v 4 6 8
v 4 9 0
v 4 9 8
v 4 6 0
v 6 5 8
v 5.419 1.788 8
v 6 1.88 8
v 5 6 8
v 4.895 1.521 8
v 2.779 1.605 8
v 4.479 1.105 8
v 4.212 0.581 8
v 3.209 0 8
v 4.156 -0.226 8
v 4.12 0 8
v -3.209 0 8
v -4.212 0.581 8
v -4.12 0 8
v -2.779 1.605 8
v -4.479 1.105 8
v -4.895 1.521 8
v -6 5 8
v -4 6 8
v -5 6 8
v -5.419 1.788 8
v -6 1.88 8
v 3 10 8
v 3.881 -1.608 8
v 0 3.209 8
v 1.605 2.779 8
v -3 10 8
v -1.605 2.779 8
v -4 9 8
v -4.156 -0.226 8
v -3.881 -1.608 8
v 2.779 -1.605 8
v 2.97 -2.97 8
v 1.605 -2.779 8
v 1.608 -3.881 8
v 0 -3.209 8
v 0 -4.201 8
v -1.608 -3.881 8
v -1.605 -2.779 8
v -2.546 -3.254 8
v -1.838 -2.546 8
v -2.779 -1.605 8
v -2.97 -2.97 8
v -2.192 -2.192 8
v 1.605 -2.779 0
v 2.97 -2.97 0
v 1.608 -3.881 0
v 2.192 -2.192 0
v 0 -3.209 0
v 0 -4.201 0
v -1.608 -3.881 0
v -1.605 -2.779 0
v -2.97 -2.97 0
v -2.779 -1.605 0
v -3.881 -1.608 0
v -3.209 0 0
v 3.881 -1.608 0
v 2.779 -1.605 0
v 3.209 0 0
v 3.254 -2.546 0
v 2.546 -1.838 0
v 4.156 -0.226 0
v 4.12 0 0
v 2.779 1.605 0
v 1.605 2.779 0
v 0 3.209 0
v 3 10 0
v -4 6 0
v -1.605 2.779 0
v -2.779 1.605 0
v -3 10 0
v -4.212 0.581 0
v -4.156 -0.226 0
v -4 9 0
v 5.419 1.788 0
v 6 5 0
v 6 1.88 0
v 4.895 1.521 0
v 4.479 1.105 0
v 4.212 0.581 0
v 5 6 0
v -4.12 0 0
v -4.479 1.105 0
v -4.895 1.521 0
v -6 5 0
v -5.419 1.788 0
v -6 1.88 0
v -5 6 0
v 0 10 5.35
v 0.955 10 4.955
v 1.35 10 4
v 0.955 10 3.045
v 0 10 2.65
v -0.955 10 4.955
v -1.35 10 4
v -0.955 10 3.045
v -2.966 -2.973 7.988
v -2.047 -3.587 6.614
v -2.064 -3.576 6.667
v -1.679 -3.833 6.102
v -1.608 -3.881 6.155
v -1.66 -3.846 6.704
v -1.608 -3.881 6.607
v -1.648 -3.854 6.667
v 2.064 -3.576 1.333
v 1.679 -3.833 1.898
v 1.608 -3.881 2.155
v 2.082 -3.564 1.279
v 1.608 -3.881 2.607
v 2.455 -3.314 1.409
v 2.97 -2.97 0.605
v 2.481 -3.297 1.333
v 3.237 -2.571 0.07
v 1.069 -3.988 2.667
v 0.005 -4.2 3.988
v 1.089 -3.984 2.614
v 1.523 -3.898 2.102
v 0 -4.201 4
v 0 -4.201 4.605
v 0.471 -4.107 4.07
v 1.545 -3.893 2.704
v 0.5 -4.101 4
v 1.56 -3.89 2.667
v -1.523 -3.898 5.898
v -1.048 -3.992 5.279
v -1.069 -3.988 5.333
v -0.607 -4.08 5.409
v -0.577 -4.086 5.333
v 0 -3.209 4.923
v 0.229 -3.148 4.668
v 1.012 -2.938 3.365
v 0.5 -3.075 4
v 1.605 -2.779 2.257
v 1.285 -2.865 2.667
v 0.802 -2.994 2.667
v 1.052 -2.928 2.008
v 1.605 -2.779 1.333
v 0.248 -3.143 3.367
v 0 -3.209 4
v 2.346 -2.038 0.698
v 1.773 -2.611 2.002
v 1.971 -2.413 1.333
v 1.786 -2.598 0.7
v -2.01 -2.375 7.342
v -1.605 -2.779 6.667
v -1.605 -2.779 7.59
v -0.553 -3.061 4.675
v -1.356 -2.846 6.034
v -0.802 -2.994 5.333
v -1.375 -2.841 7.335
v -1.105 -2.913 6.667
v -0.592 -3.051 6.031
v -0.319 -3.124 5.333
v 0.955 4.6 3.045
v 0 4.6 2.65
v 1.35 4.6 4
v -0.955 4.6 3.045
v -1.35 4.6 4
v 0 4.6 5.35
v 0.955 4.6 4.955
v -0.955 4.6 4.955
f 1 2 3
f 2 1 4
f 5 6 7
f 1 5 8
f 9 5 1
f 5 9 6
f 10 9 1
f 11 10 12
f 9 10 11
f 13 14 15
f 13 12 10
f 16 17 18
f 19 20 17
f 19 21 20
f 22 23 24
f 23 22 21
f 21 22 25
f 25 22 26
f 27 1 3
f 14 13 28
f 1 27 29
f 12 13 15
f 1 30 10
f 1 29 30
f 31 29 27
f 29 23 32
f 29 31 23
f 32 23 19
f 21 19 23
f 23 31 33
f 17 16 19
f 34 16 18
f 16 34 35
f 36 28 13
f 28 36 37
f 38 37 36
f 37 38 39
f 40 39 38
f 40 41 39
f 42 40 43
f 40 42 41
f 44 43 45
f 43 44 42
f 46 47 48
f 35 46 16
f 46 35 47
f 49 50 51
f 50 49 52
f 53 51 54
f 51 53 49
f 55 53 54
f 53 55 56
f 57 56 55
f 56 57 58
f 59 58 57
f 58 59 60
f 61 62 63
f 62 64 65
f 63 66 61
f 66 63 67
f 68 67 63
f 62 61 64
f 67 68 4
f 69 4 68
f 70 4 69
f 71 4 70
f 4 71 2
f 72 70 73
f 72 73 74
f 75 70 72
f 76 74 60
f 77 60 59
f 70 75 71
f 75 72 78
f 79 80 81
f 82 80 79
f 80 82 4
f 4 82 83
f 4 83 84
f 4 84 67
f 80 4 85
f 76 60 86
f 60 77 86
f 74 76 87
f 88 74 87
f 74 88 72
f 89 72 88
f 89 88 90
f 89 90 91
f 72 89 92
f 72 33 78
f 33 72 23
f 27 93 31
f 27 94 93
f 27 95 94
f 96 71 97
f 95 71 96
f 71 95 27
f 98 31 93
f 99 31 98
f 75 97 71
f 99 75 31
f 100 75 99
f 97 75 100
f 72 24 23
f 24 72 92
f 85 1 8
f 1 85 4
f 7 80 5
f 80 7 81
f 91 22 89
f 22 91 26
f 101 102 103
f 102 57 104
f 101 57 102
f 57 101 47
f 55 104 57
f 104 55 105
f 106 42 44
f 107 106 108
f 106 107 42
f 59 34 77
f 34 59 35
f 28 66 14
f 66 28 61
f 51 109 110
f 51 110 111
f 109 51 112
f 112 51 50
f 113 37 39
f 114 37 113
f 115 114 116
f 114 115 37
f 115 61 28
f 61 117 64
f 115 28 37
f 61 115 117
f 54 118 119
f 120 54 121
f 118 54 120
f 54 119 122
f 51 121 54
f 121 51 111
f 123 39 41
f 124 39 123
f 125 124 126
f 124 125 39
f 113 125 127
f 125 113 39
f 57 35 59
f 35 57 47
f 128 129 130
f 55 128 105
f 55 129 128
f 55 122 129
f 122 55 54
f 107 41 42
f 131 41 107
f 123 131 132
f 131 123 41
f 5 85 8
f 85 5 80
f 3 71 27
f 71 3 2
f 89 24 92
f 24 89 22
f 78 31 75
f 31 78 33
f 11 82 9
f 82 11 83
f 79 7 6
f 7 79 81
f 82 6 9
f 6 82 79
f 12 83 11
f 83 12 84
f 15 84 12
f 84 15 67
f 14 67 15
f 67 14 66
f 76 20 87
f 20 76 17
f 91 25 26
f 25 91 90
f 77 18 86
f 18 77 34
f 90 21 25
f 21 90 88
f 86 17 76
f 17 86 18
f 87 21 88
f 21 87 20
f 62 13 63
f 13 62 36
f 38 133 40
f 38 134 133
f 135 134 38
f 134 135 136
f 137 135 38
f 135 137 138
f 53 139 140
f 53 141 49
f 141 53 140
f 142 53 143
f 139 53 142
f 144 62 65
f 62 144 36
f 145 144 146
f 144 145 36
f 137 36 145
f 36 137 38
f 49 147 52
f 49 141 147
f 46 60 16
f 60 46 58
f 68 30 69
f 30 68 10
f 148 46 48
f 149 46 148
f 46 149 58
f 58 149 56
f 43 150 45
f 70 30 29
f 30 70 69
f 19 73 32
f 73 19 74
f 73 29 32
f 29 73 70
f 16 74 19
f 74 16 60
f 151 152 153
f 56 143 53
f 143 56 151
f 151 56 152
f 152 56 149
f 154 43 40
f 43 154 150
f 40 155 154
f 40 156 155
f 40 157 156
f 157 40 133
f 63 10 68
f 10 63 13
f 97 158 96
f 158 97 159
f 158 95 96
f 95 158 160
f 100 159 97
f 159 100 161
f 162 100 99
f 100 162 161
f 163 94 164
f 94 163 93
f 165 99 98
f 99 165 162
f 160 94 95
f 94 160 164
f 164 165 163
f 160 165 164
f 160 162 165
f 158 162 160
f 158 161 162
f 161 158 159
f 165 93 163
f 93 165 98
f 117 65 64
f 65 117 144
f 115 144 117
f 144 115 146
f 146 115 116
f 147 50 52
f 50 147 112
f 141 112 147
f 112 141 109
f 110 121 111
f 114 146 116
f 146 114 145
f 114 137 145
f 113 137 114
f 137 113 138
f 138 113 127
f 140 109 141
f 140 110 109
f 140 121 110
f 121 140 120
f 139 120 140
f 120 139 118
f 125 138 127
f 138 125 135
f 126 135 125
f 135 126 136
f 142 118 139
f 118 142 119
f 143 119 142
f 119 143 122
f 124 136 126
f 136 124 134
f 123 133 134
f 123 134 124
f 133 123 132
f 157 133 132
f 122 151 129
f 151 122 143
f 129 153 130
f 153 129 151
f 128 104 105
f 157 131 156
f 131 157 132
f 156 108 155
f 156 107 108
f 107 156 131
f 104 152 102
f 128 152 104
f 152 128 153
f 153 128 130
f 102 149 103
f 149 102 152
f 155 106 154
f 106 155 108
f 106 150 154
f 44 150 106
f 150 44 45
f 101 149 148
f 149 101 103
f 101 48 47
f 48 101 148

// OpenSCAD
// file: parameters.scad
// Parameters file for RepRap Huxley

pi=3.14159265;

// The relative location in your file system where the .dxf files are
// DXFs are for quick development.  They should be replaced by parameterised CSG in dure course.

fileroot="DXF-files/";

rodsize = 6;	//threaded/smooth rod diameter in mm
xaxis = 182.5;	//width of base in mm
yaxis = 266.5;	//length of base in mm


screwsize = 3;	//bearing bore/screw diameter in mm
bearingsize = 10;	//outer diameter of bearings in mm
bearingwidth = 4;	//width of bearings in mm


rodpitch = rodsize / 6;
rodnutsize = 0.8 * rodsize; //4.8
rodwashersize = 0.2 * rodsize; //1.2
rodwasherdiameter = 2 * rodsize;//12
screwpitch = screwsize / 6;
nutsize = 0.8 * screwsize;
nutdiameter = 1.9 * screwsize;
washersize = 0.2 * screwsize;
washerdiameter = 2 * screwsize;
partthick = 2 * (rodsize+1); //12
vertexrodspace = 2 * rodsize; //12


c = [0.3, 0.3, 0.3];
rodendoffset = rodnutsize + rodwashersize * 2 + partthick / 2;//13.2
vertexoffset = vertexrodspace + rodendoffset;//25.2
//vertexoffset = 22;

renderrodthreads = false;
renderscrewthreads = false;
fn = 36;

// The gap between the joining rods at a vertex

vertex_radius=sqrt(rodsize*rodsize + vertexoffset*vertexoffset);
vertex_ang = atan(vertexoffset/rodsize)-30;
vertex_gap = 2*vertex_radius*cos(vertex_ang);

// Nema 14 dimensions - these are absolute

nema14_square=35.3;
nema14_screws=26;
nema14_screw_r=1.5;
nema14_hub=22;
nema14_hub_depth=2;
nema14_length=36;
nema14_shaft=5;
nema14_shaft_length=66;
nema14_shaft_projection=19;

// Nema 11 dimensions - these are absolute

nema11_square=28.5;
nema11_screws=23;
nema11_screw_r=1.25;
nema11_hub=22;
nema11_hub_depth=2;
nema11_length=44.5;
nema11_shaft=5;
nema11_shaft_length=78;
nema11_shaft_projection=18;

// Limit switch parameters

limit_switch_hole_diameter=2.5;
limit_switch_centres=9.5;

// The RepRap slide bearings

bearing_mount_centres=18;
bearing_width=7;

// X axis parameters - many should be relative

x_bar_gap=30;
motor_center_y = 26;
bar_clamp_x=5;
bar_clamp_y=8;
bar_clamp_x_gap=23;
bearing_y=50;
bearing_x=bar_clamp_x_gap + 10;
hole_land=4;
thickness=5;
bearing_low_z = 8;
bearing_z_gap = 25;
bearing_plate_width = bearing_mount_centres+2*hole_land + 10;
bearing_plate_overlap=0.5;
bearing_plate_support=10;
// file: configuration.scad
// eMAKEr Huxley
// Configuration file
// GNU GPL v3
// Jean-Marc Giacalone
// info@emakershop.com
// www.emakershop.com
// http://www.reprap.org/wiki/EMAKER_Huxley
// http://github.com/jmgiacalone/eMAKERHuxley

use <library.scad>

//Round corner diameter
round_corner_diameter = 8;

//Thin wall size
layer_height = 0.4;
perimeter_width_over_thicknes = 1.6;
infill_widht_over_thickness = 1.55;
thin_wall = 2*(perimeter_width_over_thicknes*layer_height+infill_widht_over_thickness*layer_height);
if(thin_wall<2){
	echo("Check thin wall size, its below 2mm!");
}
echo(thin_wall);

// MINI-HUXLEY VERSION (TODO, just place holder)
// include <configuration-huxley.scad>
m8_diameter=8.3;
m5_diameter=5.3;
m4_diameter=4.3;
m3_diameter=3.3;
m3_dia_clr=3.5;
m3_nut = 2.8;
m3_af = 5.8;
m6_diameter = 6;
m6_nut = 11.5;
bushing_diameter = 8;
motor_shaft=5.3;
bushing_rodsize = 6;
bushing_outerDiameter = 12;
bushing_lenght = 8;

// Some basic functions, probably should be somewhere else
// main file
include<configuration.scad>;
use<library.scad>

bushing_height=8;
socket_width=8;
socket_depth=4;
bushing_width=12;
bushing_rodsize=6.2;
bearing_length=4;
body_chamfers=1;
rod_clearance=0;//dia
thickness=0.51;

side=0;

module ptfe_bushing(a=45,b=0,c=10)
{
//body
difference()
{
	//positive
	union()
	{
		translate([0,socket_depth/2+6,bushing_height/2]) cube([socket_width,socket_depth,bushing_height],center=true);
		translate([0,bushing_width/4,bushing_height/2]) cube([bushing_width,bushing_width/2,bushing_height],center=true);
		//cylinder(h=bushing_height,r=bushing_width/2);
		polyhole(bushing_height,bushing_rodsize+thickness*4);
	}
	//negative
	union()
	{
		//groove
		polyhole(bushing_height, bushing_rodsize+rod_clearance);
		//body chamfers
		for(j=[0,1])
		{
			mirror([j,0,0]) union()
			{
				translate([bushing_width/2,bushing_width/2,0]) rotate([0,0,45]) cube([body_chamfers*sqrt(2),body_chamfers*sqrt(2),bushing_height*2],center=true);
				translate([socket_width/2,bushing_width/2+socket_depth,0]) rotate([0,0,45]) cube([body_chamfers*sqrt(2),body_chamfers*sqrt(2),bushing_height*2],center=true);
			}
		}
		//screw hole
		translate([0,(bushing_rodsize+rod_clearance)/2+1.5,bushing_height/2]) rotate([-90,0,0])
			cylinder(h=socket_depth*1.6,r=2.7/2, $fn=8);
		//slot
		translate([0,0,0]) rotate([0,0,45])
			linear_extrude(height = bushing_height, convexity = 10, twist = 90)
			translate([0, -bushing_rodsize+thickness*8-2.1, 0])
			square(size=[0.5,2.2]);//circle(r = 4);
		//outer rads
		for(j=[0,1])
		{
			mirror([j,0,0]) union()
			{
		translate([bushing_width/2,0,0]) cylinder(h=bushing_height,r=(bushing_width-(bushing_rodsize+thickness*4))/2, $fn=20);
			}
		}

	}
}
}//end module ptfe_bushing

if(side==1)
{
	ptfe_bushing(130,-90,0);
}else{
	ptfe_bushing();
}
